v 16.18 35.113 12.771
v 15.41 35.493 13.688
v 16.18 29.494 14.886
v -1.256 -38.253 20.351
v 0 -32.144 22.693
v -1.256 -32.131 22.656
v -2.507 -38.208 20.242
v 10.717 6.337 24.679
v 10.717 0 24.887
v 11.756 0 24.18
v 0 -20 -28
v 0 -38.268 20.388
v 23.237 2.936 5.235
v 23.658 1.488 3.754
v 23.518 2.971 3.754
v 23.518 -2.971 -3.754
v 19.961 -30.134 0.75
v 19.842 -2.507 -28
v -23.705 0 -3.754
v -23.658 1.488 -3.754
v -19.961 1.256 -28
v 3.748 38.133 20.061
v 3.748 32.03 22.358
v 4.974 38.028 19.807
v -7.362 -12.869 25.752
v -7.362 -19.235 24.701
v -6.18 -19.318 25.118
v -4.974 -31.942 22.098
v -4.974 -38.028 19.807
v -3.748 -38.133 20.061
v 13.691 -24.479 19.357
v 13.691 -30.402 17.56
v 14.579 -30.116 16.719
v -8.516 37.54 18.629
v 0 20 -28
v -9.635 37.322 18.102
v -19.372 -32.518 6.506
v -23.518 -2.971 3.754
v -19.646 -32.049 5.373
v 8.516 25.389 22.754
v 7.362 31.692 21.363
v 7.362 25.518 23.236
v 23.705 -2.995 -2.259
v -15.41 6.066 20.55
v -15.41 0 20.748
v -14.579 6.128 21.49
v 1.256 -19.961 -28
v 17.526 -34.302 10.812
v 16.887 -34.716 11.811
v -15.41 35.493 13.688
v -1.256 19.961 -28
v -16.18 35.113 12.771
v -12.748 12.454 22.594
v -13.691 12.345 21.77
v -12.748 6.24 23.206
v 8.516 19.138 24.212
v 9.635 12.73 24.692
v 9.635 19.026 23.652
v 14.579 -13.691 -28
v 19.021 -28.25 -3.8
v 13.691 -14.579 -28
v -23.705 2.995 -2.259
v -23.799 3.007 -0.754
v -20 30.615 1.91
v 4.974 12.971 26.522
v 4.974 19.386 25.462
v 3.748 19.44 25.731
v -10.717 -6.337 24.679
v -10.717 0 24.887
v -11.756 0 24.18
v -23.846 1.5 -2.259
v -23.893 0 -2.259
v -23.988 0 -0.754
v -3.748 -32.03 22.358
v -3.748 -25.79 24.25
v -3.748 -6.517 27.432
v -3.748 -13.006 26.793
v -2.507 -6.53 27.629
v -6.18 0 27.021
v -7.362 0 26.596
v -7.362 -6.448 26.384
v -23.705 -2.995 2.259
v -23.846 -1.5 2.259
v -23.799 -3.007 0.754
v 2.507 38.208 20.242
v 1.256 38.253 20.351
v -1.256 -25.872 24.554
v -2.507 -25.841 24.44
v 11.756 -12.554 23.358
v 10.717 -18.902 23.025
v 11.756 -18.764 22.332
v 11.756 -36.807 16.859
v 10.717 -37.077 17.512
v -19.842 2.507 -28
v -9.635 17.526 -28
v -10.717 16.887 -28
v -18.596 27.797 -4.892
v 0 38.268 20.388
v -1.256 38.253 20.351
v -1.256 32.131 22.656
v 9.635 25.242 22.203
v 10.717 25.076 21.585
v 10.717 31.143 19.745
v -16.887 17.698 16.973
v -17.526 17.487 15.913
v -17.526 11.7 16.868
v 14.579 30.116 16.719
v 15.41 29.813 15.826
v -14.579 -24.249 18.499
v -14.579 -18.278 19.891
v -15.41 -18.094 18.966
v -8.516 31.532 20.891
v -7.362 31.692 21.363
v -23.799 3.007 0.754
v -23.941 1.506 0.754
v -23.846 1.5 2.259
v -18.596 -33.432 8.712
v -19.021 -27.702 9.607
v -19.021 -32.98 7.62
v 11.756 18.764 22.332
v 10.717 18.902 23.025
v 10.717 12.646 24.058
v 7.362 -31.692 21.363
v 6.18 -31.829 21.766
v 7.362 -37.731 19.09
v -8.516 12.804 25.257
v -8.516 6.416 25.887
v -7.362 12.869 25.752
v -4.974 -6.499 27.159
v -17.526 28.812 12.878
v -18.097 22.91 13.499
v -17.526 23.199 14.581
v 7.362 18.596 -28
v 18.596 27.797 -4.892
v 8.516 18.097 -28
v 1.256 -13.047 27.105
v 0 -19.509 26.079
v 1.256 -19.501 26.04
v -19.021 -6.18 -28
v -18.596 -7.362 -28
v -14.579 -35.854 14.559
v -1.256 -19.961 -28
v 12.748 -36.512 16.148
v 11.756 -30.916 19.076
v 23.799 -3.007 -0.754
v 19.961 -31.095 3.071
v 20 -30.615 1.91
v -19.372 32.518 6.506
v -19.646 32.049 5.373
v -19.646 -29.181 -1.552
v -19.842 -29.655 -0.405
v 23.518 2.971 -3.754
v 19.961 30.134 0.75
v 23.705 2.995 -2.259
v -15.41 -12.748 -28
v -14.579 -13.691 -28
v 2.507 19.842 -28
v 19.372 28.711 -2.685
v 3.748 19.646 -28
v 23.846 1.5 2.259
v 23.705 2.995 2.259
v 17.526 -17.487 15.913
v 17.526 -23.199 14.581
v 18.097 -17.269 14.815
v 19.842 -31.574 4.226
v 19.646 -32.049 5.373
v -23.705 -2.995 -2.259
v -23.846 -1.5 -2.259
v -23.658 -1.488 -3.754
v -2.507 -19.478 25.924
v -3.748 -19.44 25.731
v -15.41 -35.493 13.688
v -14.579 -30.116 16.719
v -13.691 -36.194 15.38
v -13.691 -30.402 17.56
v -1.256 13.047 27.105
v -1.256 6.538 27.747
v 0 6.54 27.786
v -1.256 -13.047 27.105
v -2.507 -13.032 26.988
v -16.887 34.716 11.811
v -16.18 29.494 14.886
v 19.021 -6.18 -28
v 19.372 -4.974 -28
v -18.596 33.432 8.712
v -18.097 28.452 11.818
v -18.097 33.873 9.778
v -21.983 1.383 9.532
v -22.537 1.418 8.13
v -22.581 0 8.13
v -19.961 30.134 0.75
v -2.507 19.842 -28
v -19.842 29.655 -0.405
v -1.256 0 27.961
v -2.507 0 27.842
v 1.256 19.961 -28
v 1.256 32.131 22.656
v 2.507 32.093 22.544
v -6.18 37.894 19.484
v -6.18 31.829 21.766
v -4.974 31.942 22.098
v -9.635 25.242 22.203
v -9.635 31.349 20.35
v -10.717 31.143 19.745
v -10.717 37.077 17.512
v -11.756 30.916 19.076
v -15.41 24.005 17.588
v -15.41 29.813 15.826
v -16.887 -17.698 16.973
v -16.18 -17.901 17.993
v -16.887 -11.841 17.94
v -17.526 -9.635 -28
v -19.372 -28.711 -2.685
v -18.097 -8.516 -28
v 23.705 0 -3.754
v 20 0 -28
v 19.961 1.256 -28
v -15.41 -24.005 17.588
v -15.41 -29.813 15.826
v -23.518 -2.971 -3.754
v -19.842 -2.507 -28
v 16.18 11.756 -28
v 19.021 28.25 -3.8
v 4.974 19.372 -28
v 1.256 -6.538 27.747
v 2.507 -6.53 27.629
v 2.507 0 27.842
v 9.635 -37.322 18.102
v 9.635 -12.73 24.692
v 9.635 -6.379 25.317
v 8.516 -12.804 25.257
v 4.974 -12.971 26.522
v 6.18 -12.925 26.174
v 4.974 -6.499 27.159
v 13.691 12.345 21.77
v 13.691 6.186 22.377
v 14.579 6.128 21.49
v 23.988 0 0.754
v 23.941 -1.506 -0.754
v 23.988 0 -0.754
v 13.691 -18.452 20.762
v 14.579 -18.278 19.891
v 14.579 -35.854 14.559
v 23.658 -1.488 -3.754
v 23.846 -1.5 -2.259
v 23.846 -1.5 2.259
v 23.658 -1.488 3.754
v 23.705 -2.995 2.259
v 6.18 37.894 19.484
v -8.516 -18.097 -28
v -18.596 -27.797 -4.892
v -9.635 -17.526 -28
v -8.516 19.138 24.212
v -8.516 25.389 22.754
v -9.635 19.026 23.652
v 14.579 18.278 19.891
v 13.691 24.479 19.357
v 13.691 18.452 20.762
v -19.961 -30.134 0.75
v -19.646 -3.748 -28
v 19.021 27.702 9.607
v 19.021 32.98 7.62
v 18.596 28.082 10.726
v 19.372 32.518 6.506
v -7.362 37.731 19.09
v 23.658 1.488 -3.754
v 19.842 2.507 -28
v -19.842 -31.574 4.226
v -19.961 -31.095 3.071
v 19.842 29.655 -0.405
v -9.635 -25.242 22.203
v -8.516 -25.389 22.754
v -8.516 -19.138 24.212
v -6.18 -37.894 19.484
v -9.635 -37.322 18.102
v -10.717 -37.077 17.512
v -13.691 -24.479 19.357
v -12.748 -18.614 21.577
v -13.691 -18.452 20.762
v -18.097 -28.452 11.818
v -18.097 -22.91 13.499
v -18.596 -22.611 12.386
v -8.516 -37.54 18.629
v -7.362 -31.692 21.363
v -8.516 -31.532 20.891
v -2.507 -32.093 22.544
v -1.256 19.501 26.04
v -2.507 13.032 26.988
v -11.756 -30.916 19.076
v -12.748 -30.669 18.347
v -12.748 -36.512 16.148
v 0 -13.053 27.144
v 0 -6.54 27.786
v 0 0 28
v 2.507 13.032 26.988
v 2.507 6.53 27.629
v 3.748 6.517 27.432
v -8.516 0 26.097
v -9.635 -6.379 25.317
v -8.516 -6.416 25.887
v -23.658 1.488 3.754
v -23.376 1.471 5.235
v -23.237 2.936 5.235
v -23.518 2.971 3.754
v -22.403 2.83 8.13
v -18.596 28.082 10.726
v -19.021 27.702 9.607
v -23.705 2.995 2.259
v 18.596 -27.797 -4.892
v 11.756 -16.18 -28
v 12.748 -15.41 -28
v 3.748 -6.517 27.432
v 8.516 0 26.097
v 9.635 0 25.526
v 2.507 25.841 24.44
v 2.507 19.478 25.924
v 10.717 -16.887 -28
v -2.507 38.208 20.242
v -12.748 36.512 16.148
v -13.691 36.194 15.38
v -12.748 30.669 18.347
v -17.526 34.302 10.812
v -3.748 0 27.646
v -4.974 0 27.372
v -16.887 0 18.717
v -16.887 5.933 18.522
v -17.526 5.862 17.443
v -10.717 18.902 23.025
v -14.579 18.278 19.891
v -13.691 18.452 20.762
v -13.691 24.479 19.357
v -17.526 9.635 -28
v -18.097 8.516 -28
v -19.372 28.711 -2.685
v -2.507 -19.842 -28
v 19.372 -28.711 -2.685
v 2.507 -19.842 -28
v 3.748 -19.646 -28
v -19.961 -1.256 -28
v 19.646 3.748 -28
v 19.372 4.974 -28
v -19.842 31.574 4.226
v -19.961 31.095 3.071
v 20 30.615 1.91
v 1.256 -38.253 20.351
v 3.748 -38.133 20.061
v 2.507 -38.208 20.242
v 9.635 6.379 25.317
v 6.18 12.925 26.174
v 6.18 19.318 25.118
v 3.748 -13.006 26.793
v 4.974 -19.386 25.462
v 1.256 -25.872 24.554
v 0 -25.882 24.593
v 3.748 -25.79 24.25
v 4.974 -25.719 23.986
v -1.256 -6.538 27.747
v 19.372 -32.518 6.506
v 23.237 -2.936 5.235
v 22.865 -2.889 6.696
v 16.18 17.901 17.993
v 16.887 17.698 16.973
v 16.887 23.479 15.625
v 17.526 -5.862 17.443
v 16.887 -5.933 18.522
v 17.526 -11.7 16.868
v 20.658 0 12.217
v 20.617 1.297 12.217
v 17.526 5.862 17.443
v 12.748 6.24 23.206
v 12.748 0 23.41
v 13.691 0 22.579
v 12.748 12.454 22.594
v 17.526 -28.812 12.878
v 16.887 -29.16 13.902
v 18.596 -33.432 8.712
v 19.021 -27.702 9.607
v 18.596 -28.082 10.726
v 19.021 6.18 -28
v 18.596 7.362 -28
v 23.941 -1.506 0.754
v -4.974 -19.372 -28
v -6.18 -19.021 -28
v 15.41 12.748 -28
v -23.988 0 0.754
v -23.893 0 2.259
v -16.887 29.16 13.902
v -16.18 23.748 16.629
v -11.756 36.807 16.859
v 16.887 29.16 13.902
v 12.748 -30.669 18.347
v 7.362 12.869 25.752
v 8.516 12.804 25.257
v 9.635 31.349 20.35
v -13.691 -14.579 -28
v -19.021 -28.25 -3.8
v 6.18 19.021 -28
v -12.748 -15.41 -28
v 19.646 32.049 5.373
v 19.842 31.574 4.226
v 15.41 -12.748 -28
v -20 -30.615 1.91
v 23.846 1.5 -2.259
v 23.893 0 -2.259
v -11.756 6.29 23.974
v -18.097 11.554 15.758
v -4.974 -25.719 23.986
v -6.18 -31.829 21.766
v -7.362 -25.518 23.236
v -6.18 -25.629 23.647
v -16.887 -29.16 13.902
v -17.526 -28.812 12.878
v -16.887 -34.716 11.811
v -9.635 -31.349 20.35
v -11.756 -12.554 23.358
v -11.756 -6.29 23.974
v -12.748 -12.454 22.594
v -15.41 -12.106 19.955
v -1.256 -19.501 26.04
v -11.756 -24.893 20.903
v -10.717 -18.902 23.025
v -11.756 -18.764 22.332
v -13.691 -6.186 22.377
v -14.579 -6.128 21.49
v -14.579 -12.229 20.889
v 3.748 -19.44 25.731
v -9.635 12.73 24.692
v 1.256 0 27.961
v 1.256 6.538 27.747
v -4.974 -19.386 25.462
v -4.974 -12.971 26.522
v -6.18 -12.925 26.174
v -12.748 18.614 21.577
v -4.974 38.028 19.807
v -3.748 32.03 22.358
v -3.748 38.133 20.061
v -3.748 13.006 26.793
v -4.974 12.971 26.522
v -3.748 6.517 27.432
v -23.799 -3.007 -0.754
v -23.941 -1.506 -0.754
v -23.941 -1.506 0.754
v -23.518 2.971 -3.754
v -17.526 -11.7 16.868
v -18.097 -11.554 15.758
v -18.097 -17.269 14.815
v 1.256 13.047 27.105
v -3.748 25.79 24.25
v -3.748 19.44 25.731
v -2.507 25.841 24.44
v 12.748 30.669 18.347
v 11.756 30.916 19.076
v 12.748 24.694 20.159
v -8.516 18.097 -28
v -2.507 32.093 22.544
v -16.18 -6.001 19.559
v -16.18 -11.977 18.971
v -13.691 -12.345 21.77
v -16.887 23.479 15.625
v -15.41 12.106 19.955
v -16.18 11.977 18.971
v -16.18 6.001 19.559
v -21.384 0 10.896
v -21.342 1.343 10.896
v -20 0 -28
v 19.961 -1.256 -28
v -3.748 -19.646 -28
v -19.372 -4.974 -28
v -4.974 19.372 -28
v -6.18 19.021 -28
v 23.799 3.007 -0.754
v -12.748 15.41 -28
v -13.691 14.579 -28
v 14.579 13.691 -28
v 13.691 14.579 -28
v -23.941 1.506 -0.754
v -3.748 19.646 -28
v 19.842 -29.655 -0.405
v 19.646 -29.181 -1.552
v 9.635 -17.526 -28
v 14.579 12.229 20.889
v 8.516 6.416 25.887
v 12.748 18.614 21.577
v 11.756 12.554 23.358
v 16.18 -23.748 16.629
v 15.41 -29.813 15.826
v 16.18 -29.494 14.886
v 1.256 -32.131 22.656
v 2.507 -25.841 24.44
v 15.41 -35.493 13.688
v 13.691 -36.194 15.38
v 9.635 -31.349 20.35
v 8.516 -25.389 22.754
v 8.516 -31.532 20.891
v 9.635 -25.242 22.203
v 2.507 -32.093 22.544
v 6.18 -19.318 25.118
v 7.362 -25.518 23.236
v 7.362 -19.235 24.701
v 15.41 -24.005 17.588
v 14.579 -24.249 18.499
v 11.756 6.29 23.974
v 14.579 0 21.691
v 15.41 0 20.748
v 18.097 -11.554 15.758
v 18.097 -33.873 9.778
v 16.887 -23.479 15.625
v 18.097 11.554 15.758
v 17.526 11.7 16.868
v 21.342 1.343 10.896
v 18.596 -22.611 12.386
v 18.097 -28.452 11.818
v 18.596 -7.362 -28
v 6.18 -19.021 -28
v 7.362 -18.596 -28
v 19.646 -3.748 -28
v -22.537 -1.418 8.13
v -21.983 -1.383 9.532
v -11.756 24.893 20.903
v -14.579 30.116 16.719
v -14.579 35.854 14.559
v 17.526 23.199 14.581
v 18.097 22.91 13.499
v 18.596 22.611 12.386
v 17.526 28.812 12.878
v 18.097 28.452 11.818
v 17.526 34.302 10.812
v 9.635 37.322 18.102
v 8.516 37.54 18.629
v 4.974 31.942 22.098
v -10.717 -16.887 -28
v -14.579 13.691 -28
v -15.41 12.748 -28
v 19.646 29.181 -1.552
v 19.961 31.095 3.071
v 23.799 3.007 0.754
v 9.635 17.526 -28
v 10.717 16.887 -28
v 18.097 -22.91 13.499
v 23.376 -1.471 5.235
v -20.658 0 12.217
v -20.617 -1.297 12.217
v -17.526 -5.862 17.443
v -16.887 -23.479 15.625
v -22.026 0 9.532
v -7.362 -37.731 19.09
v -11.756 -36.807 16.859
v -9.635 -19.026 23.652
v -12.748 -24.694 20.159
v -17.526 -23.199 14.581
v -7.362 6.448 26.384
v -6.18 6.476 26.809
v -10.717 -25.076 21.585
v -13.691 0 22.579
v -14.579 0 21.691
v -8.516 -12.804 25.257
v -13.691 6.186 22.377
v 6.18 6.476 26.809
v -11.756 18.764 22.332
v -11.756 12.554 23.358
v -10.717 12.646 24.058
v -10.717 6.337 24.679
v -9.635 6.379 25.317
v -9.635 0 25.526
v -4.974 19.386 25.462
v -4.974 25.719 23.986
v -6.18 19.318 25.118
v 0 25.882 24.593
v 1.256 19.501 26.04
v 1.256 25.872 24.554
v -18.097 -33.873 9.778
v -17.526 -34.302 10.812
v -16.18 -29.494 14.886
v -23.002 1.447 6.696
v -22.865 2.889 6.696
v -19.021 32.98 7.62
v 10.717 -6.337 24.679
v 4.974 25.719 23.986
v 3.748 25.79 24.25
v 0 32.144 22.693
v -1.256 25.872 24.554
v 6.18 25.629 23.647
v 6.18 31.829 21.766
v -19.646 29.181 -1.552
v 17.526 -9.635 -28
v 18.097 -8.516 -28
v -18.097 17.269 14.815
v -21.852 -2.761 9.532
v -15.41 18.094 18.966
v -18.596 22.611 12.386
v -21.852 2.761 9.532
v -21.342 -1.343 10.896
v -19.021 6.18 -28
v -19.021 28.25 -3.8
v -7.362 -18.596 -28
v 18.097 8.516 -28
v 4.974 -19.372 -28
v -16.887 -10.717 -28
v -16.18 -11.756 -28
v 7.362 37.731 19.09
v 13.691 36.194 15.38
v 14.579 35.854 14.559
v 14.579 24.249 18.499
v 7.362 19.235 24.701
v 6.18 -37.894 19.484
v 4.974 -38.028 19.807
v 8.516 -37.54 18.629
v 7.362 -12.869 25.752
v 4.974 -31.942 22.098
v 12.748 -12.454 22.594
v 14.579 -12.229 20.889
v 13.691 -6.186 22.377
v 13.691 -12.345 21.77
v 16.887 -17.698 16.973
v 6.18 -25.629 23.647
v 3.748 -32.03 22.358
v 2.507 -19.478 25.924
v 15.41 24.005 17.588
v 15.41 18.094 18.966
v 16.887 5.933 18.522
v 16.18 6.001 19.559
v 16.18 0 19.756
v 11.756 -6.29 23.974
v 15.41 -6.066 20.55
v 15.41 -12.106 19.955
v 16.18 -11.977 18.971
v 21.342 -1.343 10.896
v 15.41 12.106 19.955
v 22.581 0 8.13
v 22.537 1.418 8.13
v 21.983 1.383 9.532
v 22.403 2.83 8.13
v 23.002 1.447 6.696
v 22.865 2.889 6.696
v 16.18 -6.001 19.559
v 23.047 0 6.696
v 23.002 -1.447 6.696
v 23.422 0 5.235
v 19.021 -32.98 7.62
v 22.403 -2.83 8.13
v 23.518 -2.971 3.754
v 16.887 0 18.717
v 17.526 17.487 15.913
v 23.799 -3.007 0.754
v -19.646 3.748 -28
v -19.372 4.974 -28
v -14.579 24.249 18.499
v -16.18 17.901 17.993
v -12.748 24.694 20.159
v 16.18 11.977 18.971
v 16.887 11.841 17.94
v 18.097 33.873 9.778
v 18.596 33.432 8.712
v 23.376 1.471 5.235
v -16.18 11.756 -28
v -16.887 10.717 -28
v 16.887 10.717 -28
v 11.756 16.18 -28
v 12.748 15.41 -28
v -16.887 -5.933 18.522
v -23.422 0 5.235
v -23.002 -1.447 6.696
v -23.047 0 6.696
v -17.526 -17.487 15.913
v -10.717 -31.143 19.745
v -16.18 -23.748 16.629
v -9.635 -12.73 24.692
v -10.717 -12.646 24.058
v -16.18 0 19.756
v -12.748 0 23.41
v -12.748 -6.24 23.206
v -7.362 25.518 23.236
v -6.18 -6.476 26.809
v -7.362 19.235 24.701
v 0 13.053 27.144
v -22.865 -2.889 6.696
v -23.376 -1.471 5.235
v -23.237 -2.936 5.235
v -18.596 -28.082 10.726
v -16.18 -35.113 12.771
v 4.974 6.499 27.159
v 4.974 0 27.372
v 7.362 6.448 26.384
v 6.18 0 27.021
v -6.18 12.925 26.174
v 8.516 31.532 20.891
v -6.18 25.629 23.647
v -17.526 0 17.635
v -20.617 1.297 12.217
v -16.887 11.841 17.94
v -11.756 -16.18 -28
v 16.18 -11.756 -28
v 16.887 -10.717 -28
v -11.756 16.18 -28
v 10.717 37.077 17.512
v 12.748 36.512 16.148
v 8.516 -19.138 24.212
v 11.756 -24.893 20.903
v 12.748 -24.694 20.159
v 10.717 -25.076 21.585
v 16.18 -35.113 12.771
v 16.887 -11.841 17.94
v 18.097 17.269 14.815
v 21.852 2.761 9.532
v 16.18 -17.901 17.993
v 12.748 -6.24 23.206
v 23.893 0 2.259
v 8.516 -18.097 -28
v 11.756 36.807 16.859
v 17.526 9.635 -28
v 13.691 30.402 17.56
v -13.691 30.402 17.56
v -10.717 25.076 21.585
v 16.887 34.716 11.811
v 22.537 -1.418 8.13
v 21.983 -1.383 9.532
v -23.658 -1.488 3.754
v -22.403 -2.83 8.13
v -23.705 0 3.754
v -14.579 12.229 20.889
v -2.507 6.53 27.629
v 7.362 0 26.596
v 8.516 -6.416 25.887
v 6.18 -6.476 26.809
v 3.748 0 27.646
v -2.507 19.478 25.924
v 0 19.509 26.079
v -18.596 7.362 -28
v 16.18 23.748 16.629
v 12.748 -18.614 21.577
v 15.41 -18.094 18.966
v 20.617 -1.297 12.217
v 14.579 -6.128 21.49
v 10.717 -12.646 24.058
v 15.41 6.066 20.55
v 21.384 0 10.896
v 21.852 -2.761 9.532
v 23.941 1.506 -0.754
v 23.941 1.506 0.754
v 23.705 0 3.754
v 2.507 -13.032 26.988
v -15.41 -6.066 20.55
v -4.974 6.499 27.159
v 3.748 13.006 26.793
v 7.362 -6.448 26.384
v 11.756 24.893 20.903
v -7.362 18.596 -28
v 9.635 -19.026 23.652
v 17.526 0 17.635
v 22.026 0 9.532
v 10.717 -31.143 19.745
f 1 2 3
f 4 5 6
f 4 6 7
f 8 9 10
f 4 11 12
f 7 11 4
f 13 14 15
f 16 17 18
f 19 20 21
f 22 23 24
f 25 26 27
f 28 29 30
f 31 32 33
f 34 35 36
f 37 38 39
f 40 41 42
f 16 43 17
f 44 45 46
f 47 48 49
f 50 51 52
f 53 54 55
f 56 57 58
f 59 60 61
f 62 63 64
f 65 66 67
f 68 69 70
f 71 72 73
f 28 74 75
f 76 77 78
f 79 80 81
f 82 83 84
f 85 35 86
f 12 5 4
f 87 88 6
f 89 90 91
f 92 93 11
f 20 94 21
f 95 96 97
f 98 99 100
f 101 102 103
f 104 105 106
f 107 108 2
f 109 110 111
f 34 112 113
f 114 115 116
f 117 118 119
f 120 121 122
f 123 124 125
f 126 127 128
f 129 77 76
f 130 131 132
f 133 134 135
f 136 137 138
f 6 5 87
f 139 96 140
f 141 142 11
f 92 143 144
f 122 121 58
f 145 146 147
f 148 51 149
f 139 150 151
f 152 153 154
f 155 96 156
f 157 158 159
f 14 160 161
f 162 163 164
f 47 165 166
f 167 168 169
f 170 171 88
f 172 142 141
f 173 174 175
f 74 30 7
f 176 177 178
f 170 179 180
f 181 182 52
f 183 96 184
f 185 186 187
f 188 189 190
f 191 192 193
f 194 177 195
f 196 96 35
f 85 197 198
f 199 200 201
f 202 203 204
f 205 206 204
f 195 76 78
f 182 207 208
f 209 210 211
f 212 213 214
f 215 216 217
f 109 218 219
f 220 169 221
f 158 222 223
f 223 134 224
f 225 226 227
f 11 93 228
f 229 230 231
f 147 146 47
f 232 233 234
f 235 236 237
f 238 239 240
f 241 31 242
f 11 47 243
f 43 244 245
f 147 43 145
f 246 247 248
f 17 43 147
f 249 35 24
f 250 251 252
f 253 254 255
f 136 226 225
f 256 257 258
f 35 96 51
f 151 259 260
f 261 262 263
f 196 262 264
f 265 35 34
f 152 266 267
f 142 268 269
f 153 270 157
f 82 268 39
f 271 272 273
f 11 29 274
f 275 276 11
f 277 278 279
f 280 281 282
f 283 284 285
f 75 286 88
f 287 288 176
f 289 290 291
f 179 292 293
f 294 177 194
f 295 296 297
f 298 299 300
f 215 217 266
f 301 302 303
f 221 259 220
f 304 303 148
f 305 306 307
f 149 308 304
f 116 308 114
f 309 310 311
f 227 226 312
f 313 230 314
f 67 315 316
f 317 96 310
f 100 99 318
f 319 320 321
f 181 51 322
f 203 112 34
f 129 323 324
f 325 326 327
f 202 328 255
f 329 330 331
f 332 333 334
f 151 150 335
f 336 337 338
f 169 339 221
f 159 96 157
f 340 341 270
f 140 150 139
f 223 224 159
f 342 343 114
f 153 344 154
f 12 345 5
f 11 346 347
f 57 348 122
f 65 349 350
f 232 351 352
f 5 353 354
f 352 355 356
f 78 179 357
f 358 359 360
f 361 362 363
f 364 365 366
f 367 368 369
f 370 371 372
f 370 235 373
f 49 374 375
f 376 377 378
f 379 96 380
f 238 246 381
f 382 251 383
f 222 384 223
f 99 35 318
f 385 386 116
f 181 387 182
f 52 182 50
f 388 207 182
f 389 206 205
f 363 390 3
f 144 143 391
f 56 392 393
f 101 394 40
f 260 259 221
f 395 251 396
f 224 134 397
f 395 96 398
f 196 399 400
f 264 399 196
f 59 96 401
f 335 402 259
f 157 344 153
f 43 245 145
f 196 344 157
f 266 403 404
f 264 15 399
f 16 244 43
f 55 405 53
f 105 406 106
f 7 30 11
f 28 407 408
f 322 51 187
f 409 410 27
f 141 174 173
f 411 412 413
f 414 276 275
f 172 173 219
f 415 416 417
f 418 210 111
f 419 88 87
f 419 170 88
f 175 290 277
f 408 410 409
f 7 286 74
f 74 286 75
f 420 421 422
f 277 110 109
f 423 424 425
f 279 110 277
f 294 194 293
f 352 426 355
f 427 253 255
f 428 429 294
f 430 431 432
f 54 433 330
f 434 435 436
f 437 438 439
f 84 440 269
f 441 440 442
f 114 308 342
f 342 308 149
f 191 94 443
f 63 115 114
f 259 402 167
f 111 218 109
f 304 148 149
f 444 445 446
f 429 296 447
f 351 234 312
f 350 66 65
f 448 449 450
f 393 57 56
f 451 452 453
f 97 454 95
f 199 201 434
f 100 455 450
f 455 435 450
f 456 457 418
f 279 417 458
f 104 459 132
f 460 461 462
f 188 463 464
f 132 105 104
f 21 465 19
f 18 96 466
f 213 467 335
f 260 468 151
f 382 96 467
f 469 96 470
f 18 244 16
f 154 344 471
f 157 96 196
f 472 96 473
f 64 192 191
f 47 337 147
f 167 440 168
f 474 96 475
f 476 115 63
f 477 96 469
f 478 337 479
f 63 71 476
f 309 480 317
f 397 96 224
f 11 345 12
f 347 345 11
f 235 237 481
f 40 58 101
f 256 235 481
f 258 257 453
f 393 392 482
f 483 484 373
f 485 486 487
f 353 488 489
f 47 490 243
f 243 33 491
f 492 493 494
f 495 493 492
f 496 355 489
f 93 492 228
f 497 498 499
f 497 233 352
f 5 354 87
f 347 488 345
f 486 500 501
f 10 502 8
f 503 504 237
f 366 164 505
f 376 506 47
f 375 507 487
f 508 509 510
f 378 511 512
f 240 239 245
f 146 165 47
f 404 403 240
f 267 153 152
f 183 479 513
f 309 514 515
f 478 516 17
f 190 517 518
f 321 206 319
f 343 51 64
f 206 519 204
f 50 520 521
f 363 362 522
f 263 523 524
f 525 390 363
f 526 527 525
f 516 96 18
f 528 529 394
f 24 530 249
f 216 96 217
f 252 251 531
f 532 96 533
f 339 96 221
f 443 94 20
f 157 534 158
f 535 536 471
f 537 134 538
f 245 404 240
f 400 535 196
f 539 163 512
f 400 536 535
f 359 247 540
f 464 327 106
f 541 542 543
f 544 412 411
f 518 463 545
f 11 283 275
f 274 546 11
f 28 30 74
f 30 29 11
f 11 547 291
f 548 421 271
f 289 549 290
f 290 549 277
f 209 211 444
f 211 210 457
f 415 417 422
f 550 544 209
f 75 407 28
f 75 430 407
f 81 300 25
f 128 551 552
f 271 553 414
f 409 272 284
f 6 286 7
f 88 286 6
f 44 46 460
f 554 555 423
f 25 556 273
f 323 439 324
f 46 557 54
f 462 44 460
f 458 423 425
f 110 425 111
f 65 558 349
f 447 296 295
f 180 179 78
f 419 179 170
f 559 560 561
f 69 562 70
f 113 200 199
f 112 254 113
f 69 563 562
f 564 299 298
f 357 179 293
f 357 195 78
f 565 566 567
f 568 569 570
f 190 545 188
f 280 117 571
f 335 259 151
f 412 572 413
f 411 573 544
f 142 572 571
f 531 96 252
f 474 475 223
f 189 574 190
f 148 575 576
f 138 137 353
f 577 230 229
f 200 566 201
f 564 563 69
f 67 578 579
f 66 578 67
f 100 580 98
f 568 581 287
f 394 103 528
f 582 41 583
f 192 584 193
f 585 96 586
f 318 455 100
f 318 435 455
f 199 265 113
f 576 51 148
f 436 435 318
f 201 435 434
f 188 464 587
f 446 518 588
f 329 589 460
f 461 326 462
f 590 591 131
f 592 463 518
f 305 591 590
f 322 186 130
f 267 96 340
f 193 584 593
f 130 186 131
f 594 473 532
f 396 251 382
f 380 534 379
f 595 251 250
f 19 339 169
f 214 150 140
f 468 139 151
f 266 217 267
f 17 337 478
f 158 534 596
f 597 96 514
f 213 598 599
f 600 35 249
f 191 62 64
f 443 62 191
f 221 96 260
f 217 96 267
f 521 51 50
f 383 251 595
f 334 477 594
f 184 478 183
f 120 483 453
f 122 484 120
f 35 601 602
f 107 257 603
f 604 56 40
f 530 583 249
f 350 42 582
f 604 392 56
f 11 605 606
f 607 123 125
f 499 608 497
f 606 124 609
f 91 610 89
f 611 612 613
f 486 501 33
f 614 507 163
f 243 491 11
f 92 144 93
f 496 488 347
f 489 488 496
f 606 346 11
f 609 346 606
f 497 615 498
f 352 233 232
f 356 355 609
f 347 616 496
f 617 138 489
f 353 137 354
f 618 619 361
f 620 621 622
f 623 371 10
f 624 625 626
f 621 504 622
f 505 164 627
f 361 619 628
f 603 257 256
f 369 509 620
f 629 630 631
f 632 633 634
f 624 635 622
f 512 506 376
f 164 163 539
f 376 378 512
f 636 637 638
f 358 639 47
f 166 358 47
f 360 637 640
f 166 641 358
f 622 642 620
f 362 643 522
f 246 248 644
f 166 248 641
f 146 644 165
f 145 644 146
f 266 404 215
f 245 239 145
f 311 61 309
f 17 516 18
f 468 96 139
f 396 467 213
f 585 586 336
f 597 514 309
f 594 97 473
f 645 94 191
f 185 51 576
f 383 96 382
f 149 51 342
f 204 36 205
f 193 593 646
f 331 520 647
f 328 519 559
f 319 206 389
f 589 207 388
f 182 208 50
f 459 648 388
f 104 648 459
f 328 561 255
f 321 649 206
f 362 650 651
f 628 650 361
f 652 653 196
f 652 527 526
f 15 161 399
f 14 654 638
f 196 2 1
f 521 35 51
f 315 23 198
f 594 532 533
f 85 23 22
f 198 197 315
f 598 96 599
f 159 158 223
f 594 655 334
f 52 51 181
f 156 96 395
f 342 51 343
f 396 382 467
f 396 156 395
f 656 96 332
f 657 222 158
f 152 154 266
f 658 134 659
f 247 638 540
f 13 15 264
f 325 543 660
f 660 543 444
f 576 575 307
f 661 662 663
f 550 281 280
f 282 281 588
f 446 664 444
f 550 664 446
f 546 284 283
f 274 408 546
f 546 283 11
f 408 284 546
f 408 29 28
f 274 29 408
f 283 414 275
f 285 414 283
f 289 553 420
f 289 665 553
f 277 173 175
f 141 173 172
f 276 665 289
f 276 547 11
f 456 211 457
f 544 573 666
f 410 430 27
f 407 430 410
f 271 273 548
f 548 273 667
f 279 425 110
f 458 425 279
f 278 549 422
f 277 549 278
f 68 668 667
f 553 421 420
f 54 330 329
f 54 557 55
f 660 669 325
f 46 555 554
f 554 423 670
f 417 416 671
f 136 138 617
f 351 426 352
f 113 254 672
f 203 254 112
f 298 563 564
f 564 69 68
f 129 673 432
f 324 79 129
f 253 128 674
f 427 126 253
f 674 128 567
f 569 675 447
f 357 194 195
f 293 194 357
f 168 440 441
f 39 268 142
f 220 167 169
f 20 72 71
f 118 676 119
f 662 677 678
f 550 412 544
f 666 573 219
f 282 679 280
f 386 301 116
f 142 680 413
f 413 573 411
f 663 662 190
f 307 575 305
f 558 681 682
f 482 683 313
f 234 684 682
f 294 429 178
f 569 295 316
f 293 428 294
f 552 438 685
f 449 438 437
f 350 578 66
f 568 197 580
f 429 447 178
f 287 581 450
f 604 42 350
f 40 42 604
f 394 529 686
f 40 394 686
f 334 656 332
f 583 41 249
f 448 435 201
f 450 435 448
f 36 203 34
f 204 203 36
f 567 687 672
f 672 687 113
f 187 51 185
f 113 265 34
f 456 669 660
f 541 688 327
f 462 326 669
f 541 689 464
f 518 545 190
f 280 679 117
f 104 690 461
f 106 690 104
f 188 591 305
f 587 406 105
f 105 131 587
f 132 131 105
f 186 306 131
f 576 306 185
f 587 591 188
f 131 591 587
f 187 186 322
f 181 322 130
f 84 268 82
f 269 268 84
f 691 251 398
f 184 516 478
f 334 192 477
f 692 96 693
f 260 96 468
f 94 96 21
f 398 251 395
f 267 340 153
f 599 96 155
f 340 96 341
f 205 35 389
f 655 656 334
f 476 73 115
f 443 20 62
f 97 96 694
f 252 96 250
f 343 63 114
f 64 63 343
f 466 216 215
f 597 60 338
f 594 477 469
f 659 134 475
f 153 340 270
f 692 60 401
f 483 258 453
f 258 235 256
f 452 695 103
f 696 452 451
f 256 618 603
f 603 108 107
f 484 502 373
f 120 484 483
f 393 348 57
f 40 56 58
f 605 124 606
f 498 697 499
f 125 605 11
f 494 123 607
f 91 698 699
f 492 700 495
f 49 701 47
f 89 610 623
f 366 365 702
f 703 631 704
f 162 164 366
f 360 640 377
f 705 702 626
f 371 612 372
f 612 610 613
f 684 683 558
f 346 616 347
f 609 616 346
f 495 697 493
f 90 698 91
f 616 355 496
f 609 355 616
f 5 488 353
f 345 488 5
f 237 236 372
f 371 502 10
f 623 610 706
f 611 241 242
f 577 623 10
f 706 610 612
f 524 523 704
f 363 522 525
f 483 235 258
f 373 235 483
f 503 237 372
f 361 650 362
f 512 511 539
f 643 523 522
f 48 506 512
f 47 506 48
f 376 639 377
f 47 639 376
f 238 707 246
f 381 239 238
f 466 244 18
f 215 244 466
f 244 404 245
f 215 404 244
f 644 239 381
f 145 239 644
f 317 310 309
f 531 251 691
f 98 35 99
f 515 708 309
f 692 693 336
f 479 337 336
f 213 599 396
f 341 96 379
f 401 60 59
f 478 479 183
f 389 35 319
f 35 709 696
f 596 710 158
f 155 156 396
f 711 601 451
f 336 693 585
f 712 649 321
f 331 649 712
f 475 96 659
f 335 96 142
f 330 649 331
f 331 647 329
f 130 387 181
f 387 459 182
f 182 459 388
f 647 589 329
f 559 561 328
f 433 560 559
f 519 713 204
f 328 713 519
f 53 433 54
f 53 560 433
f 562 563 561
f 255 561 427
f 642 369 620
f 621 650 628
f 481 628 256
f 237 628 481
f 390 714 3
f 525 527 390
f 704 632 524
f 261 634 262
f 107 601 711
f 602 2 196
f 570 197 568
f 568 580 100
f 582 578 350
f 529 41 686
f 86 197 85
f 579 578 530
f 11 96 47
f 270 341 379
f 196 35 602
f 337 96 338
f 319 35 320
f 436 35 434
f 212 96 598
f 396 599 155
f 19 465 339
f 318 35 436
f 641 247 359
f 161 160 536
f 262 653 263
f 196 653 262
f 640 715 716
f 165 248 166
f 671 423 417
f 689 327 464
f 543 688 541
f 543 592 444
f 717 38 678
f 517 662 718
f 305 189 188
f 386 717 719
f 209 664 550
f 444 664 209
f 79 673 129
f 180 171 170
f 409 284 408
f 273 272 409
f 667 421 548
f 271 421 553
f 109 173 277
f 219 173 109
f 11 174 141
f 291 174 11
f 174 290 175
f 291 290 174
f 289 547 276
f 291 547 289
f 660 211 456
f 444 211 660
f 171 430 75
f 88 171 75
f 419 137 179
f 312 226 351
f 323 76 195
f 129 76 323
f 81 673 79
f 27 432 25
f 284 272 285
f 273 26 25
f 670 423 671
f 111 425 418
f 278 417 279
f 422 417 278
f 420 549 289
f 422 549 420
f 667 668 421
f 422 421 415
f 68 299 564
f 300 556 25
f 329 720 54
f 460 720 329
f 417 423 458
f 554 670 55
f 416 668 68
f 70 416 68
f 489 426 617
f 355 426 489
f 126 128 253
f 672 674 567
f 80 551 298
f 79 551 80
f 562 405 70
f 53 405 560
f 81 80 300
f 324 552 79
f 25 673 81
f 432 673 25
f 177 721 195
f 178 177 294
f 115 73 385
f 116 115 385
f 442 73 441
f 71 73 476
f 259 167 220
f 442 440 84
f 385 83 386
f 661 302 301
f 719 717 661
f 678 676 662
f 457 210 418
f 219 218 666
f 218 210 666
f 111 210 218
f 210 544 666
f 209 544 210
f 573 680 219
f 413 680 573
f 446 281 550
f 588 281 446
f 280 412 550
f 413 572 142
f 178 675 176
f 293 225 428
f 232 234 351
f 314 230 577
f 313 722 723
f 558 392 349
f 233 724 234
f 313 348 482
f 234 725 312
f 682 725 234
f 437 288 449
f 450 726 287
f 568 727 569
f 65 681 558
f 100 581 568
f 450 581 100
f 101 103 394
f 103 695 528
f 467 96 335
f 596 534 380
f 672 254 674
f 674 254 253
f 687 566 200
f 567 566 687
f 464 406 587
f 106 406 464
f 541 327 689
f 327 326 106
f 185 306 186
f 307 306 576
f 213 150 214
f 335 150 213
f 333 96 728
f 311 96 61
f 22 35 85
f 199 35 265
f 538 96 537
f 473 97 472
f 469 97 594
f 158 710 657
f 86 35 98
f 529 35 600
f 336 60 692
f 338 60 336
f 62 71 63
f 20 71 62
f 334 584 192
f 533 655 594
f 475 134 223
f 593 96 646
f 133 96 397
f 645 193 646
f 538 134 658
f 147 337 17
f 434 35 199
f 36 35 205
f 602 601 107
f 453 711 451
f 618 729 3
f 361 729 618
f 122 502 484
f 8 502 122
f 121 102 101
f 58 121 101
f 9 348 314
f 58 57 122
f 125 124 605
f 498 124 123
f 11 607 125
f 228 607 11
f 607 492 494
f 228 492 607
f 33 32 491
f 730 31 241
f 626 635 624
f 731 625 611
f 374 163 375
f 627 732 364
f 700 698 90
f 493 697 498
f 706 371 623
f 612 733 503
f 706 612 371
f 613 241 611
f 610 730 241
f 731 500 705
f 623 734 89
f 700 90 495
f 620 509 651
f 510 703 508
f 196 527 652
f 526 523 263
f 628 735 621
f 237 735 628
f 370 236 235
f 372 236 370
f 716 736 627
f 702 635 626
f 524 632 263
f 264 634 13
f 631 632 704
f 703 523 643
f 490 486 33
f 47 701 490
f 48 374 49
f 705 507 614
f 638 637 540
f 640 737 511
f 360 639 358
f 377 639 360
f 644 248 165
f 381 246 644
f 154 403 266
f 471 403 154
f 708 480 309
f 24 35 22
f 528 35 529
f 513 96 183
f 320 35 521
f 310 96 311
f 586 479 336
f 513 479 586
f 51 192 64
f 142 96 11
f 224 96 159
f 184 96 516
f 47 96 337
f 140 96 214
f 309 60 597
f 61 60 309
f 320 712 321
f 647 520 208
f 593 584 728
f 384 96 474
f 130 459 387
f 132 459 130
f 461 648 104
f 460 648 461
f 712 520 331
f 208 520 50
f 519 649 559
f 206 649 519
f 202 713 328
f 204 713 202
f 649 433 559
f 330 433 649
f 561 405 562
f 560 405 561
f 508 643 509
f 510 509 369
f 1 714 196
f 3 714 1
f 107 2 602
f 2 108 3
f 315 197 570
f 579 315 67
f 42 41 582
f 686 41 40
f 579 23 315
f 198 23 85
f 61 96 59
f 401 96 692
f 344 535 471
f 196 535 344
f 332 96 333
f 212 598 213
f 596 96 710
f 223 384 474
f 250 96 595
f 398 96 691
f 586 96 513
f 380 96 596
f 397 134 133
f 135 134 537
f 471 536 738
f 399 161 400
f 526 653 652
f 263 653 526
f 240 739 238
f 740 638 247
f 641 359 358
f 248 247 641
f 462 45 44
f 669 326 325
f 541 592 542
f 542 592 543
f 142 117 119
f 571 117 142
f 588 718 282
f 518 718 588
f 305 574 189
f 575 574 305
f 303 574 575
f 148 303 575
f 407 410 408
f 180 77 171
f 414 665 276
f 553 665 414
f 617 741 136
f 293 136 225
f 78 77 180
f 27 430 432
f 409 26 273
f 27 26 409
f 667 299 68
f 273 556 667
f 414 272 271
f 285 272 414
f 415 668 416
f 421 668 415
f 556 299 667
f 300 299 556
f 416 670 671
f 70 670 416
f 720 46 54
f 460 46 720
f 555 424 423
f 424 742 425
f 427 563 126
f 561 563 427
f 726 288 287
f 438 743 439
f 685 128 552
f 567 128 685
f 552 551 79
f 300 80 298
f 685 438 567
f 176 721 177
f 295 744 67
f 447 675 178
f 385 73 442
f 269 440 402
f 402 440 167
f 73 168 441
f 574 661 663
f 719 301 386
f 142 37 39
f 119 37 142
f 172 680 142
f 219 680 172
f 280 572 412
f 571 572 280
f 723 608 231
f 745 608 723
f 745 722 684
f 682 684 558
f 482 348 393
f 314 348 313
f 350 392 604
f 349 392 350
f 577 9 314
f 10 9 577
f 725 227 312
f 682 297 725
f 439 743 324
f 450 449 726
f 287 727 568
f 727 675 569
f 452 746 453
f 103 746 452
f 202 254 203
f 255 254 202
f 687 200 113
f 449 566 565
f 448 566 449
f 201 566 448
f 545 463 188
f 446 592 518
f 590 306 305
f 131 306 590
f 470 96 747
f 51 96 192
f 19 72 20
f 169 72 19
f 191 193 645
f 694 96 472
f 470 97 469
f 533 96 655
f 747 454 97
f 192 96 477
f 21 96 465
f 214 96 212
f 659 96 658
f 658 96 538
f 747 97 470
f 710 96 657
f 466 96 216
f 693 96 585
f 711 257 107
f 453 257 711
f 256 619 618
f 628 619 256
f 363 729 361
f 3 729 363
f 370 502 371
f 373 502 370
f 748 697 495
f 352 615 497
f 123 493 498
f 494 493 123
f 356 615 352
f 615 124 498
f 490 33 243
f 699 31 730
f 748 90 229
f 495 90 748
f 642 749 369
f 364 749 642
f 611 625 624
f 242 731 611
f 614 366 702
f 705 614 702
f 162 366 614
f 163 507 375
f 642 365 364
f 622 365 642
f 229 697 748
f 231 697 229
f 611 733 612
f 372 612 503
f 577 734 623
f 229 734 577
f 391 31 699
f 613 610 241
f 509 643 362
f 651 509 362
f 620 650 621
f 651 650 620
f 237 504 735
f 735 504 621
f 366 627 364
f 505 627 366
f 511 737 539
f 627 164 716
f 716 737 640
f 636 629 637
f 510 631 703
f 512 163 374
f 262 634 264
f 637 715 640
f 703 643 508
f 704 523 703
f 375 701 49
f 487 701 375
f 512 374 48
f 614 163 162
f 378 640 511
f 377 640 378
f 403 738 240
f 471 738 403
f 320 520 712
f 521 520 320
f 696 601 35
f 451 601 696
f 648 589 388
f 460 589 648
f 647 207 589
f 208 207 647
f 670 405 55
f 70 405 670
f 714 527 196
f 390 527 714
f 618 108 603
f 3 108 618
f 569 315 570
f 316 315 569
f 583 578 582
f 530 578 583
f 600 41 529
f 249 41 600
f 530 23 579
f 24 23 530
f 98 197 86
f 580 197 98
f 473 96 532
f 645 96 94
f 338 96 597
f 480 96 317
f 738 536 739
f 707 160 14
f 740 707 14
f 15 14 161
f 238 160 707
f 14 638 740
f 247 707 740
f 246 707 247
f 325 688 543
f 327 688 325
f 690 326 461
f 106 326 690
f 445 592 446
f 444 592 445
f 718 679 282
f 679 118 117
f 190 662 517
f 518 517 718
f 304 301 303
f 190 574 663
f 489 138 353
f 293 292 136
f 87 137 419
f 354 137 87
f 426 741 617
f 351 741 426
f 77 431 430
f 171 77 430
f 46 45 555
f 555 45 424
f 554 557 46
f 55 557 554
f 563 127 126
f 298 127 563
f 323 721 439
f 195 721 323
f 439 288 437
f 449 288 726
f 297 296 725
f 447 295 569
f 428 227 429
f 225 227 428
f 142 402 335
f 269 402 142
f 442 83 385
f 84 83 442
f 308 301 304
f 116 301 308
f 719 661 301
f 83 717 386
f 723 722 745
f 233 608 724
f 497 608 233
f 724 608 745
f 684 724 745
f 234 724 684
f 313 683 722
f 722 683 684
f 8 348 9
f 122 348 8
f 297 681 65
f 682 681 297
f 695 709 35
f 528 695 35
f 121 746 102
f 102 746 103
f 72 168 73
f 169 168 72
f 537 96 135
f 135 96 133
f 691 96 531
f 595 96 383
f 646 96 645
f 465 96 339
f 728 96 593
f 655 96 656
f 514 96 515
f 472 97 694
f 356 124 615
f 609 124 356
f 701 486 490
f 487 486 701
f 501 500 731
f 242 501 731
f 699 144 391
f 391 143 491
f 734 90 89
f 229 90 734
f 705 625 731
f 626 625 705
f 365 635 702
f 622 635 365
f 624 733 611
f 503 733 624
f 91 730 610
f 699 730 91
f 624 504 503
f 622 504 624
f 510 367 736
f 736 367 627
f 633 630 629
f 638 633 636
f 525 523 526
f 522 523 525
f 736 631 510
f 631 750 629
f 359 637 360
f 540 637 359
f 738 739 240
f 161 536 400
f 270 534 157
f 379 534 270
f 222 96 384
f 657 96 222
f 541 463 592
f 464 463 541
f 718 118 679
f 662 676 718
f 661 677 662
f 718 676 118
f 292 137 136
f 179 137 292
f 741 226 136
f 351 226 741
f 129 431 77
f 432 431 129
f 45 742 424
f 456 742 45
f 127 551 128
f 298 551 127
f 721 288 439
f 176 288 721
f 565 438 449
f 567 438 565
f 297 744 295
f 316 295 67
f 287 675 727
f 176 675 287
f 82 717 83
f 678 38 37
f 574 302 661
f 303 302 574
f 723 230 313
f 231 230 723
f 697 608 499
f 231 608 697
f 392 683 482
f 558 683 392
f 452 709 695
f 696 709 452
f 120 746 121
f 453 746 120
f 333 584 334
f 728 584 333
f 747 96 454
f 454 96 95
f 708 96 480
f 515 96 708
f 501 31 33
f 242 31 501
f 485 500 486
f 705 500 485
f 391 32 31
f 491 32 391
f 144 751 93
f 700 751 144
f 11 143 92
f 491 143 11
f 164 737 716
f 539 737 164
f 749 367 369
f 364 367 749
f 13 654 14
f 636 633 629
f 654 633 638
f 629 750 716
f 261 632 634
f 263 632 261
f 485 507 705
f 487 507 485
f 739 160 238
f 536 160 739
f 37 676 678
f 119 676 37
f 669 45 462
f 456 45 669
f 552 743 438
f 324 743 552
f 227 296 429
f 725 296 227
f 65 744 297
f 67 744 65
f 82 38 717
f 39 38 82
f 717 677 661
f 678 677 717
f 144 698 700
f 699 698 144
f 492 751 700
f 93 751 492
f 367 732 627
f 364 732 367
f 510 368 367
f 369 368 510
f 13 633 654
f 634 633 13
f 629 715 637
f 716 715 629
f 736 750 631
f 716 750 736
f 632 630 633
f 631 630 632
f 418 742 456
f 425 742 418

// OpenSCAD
$fn=100;

Torso();

module Torso()
{
	scale(4)
	hull()
	{
		translate([0, 0, -18])
			rotate([0, -90, 0])
				rotate([0, 0, -22.5])
					rotate_extrude(angle=45)
						translate([20, 0, 0])
							circle(5);
		sphere(6, center=true);
		translate([0, 0, -4])
			cylinder(h=6, r=5, center=true);	
	}
}
